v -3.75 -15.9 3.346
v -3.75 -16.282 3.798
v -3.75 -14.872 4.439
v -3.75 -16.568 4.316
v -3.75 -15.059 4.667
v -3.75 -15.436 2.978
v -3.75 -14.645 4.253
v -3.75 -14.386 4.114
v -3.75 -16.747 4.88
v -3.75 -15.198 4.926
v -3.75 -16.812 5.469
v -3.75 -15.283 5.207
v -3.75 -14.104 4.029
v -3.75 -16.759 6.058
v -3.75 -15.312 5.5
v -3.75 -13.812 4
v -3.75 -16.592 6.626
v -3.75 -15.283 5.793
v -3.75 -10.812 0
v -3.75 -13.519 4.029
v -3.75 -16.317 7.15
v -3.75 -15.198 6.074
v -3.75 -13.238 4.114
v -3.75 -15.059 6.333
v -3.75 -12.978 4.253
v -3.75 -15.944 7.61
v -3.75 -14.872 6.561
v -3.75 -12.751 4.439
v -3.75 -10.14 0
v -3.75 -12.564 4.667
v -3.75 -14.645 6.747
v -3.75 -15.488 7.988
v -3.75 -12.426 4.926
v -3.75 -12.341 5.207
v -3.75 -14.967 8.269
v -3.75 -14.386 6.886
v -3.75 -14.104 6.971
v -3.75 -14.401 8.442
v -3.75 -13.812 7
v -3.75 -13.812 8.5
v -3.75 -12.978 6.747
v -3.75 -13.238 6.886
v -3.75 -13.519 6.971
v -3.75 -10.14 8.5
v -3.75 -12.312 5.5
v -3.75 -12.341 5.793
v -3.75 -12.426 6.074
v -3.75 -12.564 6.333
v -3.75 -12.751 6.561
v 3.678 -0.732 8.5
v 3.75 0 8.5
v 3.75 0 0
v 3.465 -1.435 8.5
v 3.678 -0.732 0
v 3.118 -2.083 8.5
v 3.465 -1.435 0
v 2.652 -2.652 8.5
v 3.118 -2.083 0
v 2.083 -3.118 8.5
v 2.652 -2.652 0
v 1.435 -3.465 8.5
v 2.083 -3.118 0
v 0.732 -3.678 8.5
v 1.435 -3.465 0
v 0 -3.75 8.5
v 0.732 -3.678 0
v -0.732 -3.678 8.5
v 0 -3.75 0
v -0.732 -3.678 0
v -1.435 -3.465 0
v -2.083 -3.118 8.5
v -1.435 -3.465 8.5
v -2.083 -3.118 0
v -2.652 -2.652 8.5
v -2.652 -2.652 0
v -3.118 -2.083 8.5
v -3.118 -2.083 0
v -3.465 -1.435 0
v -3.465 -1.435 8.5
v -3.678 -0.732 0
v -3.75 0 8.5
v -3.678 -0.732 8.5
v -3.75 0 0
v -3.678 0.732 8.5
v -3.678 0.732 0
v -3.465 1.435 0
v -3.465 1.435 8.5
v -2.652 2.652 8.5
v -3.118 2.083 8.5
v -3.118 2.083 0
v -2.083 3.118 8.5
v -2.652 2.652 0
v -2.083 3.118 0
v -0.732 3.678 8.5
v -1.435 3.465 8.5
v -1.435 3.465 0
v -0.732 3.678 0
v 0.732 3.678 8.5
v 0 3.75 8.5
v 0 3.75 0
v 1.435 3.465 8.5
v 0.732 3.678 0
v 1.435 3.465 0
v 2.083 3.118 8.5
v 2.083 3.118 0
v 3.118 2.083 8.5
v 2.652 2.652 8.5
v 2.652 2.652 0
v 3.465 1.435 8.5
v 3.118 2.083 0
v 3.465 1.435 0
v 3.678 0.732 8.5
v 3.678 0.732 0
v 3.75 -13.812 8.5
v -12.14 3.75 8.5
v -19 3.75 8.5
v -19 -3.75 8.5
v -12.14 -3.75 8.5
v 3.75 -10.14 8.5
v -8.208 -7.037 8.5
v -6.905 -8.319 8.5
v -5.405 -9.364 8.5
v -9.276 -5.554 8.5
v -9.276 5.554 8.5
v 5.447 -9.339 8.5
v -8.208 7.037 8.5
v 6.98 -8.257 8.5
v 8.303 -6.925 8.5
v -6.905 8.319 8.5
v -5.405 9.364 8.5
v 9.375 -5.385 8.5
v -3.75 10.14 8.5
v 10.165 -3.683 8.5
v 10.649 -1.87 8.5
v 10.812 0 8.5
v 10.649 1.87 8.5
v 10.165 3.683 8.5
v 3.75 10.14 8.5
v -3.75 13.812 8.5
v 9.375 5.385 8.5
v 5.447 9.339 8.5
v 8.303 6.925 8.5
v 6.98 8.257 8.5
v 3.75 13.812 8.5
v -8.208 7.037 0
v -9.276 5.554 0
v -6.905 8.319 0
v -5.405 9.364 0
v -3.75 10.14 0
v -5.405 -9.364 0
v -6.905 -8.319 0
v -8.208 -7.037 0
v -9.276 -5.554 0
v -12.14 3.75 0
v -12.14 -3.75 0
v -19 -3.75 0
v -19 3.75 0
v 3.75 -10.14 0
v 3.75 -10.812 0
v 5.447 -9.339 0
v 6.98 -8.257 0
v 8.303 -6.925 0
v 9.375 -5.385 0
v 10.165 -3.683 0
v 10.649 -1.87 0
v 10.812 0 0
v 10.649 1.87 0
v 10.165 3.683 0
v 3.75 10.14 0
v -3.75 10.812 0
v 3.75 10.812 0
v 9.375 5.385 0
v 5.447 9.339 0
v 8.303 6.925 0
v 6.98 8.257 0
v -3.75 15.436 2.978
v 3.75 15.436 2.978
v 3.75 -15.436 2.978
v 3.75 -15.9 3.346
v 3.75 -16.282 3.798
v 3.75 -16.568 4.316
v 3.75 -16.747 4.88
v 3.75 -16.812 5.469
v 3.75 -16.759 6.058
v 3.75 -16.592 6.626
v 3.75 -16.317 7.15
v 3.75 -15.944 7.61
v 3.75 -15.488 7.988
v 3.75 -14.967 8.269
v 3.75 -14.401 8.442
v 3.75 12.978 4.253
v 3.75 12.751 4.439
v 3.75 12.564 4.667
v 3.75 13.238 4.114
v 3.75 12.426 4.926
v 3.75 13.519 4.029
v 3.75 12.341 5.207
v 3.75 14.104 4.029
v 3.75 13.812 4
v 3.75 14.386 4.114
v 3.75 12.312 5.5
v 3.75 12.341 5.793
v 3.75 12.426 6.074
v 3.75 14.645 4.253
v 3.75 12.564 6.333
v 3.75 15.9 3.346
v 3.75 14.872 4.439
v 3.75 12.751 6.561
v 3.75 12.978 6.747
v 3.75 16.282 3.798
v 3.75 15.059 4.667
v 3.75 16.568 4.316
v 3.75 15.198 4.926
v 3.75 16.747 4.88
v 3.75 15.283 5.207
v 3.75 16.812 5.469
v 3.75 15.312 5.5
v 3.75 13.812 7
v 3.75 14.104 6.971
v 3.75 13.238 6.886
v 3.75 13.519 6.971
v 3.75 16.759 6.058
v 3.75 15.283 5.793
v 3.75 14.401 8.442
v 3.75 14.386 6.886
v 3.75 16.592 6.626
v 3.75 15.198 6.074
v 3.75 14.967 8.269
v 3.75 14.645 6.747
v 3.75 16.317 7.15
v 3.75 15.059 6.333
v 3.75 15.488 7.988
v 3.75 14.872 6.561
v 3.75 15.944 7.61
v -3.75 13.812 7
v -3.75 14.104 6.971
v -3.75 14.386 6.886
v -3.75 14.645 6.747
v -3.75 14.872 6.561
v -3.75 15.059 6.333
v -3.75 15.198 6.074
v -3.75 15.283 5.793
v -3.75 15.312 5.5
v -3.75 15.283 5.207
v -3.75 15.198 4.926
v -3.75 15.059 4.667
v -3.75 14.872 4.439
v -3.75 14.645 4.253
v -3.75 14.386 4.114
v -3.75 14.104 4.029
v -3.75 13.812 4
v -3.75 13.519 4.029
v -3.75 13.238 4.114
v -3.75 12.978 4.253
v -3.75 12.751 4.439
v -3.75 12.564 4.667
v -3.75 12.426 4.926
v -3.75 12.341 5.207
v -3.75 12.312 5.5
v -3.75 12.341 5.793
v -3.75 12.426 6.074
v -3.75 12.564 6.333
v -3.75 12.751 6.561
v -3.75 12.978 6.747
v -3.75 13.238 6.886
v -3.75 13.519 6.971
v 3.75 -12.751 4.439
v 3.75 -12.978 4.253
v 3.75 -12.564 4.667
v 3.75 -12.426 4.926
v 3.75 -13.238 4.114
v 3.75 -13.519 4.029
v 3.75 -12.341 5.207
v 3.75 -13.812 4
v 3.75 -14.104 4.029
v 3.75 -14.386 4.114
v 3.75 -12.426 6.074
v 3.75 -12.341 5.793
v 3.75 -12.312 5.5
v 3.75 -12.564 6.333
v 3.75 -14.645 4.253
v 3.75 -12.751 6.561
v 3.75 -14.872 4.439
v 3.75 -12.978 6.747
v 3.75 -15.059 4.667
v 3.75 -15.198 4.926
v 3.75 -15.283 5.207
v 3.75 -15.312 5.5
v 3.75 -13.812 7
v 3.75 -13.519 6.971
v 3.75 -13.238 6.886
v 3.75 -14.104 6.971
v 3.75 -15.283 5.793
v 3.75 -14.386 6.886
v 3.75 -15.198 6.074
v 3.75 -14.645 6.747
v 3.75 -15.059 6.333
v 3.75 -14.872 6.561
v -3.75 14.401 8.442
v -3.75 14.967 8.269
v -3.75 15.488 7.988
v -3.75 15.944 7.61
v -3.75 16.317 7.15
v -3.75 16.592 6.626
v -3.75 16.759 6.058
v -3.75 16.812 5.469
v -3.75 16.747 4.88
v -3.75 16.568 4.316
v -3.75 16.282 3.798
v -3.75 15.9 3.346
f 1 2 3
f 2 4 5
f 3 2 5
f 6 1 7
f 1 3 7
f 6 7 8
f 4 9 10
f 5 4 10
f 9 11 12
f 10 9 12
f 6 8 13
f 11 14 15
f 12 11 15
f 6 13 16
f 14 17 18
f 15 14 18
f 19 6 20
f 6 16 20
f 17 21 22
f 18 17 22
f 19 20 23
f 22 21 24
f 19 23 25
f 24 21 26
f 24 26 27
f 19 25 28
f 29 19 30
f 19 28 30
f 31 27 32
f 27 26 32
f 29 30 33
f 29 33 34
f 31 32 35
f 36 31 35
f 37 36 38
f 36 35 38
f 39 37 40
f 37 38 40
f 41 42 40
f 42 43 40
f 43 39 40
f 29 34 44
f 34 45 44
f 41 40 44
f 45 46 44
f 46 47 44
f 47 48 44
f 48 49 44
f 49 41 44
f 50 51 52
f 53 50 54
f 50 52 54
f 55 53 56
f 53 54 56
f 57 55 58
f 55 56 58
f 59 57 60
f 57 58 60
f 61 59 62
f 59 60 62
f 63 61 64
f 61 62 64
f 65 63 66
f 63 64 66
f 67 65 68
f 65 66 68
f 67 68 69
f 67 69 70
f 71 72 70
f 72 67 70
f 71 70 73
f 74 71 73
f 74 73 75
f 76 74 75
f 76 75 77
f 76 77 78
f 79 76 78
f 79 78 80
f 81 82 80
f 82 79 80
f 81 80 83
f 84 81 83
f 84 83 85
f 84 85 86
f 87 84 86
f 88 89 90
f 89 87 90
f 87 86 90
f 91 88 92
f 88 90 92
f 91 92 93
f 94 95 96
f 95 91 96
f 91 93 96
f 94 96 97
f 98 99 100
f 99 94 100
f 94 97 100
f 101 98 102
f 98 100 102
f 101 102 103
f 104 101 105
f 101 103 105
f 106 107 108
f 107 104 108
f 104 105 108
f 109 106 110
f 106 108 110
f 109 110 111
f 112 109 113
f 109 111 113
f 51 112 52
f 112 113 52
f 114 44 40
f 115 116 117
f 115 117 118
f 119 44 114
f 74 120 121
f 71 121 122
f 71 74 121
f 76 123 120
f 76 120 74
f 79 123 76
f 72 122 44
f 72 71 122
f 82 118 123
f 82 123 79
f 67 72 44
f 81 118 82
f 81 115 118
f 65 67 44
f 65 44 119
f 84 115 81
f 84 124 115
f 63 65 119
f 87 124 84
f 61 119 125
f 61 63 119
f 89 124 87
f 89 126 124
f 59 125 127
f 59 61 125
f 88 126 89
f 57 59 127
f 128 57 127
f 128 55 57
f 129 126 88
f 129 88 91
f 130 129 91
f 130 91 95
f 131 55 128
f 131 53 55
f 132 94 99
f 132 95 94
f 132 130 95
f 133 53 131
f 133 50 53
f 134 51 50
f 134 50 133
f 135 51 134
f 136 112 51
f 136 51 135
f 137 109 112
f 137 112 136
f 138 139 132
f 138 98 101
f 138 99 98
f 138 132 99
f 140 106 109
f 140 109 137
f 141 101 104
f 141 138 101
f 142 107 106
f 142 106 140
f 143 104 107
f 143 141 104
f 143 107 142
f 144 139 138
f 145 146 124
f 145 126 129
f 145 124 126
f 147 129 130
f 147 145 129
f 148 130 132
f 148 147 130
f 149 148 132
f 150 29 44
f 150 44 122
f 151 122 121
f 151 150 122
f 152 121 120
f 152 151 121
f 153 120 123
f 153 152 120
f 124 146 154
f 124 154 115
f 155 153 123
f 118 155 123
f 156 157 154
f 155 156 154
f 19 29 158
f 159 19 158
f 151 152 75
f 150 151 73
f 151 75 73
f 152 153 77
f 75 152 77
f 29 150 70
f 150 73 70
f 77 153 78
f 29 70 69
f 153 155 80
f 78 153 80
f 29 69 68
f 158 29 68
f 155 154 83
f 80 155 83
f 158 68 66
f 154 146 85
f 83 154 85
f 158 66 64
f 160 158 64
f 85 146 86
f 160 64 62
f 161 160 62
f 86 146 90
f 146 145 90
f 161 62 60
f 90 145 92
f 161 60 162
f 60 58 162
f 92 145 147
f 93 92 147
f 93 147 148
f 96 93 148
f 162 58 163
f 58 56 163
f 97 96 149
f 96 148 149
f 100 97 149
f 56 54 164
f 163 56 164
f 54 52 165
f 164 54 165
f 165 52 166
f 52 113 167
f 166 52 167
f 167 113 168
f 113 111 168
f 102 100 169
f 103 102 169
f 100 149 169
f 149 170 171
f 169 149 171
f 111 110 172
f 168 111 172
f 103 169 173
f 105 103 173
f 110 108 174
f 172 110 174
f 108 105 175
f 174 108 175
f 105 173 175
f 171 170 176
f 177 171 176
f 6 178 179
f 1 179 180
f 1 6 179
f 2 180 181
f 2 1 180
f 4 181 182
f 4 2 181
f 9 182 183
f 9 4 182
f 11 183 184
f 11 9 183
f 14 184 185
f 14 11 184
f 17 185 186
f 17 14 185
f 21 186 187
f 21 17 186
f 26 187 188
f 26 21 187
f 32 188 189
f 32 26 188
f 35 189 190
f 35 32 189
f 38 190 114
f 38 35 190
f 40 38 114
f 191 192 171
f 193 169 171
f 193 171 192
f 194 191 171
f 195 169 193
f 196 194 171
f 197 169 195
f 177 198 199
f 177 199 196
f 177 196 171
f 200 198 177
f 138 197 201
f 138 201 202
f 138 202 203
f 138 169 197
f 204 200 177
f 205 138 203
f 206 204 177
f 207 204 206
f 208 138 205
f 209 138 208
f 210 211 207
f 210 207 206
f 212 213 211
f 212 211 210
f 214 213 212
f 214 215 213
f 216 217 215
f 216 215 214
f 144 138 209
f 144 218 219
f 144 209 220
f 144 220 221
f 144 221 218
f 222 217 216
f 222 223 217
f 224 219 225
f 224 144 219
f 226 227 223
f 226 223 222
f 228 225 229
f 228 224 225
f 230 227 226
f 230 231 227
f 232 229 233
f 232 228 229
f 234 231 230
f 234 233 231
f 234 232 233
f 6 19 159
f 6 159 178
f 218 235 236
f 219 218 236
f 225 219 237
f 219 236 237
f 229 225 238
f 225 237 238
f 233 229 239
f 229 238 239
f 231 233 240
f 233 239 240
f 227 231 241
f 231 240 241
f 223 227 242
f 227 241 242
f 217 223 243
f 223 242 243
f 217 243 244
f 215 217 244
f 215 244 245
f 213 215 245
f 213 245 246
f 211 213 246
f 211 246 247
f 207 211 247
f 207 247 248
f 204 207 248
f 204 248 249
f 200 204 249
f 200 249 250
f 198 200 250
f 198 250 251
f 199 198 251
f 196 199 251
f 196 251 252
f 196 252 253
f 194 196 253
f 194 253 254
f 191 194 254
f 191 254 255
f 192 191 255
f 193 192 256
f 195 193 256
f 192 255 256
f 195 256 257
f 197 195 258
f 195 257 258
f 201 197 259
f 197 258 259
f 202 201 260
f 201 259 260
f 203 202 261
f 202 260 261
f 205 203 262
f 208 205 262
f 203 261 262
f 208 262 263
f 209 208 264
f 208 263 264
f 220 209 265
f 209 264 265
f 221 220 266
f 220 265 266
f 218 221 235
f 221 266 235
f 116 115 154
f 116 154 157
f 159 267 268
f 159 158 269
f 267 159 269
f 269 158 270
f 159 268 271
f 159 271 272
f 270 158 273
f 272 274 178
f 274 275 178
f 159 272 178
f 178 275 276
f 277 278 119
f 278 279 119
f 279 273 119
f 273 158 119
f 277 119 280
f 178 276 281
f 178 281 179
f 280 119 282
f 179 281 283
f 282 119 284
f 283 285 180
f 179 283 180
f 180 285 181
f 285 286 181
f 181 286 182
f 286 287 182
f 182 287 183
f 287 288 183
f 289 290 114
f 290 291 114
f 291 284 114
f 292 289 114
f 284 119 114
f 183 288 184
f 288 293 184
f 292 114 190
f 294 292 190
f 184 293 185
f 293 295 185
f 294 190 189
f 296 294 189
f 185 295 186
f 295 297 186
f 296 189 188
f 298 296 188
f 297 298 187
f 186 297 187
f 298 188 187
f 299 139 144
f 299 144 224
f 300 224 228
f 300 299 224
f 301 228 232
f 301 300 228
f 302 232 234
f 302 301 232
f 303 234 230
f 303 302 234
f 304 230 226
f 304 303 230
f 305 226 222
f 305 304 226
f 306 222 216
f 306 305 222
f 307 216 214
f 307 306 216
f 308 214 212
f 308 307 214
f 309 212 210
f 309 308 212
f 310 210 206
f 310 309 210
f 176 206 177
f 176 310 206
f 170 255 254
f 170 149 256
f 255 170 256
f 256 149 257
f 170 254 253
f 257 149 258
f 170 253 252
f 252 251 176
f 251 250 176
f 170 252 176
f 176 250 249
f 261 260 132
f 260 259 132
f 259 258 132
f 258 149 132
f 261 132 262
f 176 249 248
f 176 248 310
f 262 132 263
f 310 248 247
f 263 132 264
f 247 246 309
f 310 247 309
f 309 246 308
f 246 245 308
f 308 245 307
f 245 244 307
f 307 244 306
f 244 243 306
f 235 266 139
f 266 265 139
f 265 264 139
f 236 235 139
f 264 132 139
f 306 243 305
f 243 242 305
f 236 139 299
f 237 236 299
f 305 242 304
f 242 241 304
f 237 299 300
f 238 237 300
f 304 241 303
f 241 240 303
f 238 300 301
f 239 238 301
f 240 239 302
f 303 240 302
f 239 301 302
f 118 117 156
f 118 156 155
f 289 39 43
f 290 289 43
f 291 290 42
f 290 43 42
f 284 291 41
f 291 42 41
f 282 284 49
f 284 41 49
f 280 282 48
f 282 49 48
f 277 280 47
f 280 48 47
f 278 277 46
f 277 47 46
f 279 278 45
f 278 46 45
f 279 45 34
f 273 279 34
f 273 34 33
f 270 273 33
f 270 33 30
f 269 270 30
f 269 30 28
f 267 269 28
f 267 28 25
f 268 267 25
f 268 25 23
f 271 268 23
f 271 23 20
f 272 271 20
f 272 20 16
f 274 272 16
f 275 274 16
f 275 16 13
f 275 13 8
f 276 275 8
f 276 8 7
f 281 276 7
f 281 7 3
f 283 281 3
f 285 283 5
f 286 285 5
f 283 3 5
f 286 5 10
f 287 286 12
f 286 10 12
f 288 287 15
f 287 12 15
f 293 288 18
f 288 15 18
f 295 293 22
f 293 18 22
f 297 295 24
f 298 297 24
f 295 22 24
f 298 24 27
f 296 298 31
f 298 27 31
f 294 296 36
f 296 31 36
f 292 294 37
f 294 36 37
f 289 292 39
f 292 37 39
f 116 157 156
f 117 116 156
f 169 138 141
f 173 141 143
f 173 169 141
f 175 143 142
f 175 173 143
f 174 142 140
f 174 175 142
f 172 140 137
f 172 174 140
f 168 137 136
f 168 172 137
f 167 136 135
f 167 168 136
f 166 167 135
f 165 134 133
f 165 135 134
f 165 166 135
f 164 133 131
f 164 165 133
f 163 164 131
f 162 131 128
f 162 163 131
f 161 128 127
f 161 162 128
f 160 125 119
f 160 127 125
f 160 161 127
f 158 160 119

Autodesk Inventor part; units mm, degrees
ref_plane "YZ Plane" through (0, 0, 0) normal (1, 0, 0) x (0, 1, 0)
ref_plane "XZ Plane" through (0, 0, 0) normal (0, 1, 0) x (-1, 0, 0)
ref_plane "XY Plane" through (0, 0, 0) normal (0, 0, 1) x (1, 0, 0)
sketch "Sketch1" plane through (0, 0, 0) normal (0, 0, 1) x (1, 0, 0)
  circle A0 centre (0, 0) radius 3.75 projected
  line L0 (10.8, -10.8193) -> (10.8234, 10.804) projected
  line L1 (-10.8, 10.8274) -> (-10.8234, -10.7959) projected
  arc A1 (-10.1405, -3.75) -> (-10.1405, 3.75) centre (0, 0) ccw
  line L2 (0, 3.75) -> (-19, 3.75)
  line L3 (0, 3.75) -> (19, 3.75) construction
  line L4 (-19, 3.75) -> (-19, -3.75)
  line L5 (-19, -3.75) -> (0, -3.75)
  point P0 (0, 0)
  dimension "d0" = 19
  dimension "d1" = 180
extrude "Extrusion1" add sketch "Sketch1" along normal blind 8.5 contours A0 L2 A1 L5 | A0 L5 L1 L2 | L1 L5 L4 L2
sketch "Sketch2" plane through (0, 0, 8.5) normal (0, 0, 1) x (1, 0, 0)
  arc A0 (-10.1405, -3.75) -> (-10.1405, 3.75) centre (0, 0) ccw projected
  circle A1 centre (0, 0) radius 3.75 projected
  circle A2 centre (0, 0) radius 3.75 projected
  line L0 (3.75, 0) -> (3.75, 10.8117)
  line L1 (0, 10.8117) -> (3.75, 10.8117)
  line L2 (-3.75, 0) -> (-3.75, 10.8117)
  line L3 (-3.75, 10.8117) -> (3.75, 10.8117)
  line L4 (0, -10.8117) -> (-3.75, -10.8117)
  line L5 (-3.75, -10.8117) -> (-3.75, 0)
  line L6 (3.75, 0) -> (3.75, -10.8117)
  line L7 (3.75, -10.8117) -> (-3.75, -10.8117)
  point P0 (0, 0)
  point P1 (-3.75, 10.1405)
  point P2 (3.75, 10.1405)
  point P3 (3.75, -10.1405)
  point P4 (-3.75, -10.1405)
extrude "Extrusion2" add sketch "Sketch2" against normal up to surface (8.5 mm away) contours A0 L4 L5 | A0 L6 L7 | L2 L3 A0 | A0 L1 L0
sketch "Sketch3" plane through (-3.75, -10.8117, 8.5) normal (-1, 0, 0) x (0, 0, 1)
  line L0 (0, 0) -> (-8.5, 0) projected
  line L1 (0, 21.6234) -> (-8.5, 21.6234) projected
  line L2 (0, 0) -> (0, 0.6712) projected
  line L3 (0, 0) -> (-6, 0)
  line L4 (0, 0) -> (-8.5, 0) projected
  line L5 (0, 0) -> (-3, 0)
  line L6 (-3, 0) -> (-3, -6)
  line L7 (-3, 0) -> (3, 0) construction
  circle A0 centre (-3, -3) radius 1.5
  line L8 (0, 21.6234) -> (-3, 21.6234)
  line L9 (-3, 21.6234) -> (-3, 27.6234)
  circle A1 centre (-3, 24.6234) radius 1.5
  circle A2 centre (-3, 24.6234) radius 3
  circle A3 centre (-3, -3) radius 3
  line L10 (0, 0) -> (0, -3)
  line L11 (-8.5, 0) -> (-5.5223, -4.6242)
  line L12 (0, 21.6234) -> (0, 24.6234)
  line L13 (0, 21.6234) -> (-8.5, 21.6234) projected
  line L14 (-8.5, 21.6234) -> (-5.5223, 26.2476)
  point P0 (-8.5, 10.8117)
  dimension "d6" = 6
  dimension "d7" = 3
  dimension "d8" = 6
  dimension "d9" = 90
  dimension "d10" = 3
  dimension "d11" = 3
  dimension "d12" = 6
  dimension "d13" = 3
extrude "Extrusion3" add sketch "Sketch3" against normal up to surface (7.5 mm away) contours L10 A3 L0 | A3 L11 L0 | A3 L6 A0 | L6 A0 A3 | L1 A2 L12 | A2 L9 A1 | L1 L14 A2 | L9 A1 A2
chamfer "Chamfer1" distance 2 angle 45 2 edges at (-10.1405, -3.75, 4.25) (-10.1405, 3.75, 4.25)
properties part number "NewCameraHolder_3DPrint"
